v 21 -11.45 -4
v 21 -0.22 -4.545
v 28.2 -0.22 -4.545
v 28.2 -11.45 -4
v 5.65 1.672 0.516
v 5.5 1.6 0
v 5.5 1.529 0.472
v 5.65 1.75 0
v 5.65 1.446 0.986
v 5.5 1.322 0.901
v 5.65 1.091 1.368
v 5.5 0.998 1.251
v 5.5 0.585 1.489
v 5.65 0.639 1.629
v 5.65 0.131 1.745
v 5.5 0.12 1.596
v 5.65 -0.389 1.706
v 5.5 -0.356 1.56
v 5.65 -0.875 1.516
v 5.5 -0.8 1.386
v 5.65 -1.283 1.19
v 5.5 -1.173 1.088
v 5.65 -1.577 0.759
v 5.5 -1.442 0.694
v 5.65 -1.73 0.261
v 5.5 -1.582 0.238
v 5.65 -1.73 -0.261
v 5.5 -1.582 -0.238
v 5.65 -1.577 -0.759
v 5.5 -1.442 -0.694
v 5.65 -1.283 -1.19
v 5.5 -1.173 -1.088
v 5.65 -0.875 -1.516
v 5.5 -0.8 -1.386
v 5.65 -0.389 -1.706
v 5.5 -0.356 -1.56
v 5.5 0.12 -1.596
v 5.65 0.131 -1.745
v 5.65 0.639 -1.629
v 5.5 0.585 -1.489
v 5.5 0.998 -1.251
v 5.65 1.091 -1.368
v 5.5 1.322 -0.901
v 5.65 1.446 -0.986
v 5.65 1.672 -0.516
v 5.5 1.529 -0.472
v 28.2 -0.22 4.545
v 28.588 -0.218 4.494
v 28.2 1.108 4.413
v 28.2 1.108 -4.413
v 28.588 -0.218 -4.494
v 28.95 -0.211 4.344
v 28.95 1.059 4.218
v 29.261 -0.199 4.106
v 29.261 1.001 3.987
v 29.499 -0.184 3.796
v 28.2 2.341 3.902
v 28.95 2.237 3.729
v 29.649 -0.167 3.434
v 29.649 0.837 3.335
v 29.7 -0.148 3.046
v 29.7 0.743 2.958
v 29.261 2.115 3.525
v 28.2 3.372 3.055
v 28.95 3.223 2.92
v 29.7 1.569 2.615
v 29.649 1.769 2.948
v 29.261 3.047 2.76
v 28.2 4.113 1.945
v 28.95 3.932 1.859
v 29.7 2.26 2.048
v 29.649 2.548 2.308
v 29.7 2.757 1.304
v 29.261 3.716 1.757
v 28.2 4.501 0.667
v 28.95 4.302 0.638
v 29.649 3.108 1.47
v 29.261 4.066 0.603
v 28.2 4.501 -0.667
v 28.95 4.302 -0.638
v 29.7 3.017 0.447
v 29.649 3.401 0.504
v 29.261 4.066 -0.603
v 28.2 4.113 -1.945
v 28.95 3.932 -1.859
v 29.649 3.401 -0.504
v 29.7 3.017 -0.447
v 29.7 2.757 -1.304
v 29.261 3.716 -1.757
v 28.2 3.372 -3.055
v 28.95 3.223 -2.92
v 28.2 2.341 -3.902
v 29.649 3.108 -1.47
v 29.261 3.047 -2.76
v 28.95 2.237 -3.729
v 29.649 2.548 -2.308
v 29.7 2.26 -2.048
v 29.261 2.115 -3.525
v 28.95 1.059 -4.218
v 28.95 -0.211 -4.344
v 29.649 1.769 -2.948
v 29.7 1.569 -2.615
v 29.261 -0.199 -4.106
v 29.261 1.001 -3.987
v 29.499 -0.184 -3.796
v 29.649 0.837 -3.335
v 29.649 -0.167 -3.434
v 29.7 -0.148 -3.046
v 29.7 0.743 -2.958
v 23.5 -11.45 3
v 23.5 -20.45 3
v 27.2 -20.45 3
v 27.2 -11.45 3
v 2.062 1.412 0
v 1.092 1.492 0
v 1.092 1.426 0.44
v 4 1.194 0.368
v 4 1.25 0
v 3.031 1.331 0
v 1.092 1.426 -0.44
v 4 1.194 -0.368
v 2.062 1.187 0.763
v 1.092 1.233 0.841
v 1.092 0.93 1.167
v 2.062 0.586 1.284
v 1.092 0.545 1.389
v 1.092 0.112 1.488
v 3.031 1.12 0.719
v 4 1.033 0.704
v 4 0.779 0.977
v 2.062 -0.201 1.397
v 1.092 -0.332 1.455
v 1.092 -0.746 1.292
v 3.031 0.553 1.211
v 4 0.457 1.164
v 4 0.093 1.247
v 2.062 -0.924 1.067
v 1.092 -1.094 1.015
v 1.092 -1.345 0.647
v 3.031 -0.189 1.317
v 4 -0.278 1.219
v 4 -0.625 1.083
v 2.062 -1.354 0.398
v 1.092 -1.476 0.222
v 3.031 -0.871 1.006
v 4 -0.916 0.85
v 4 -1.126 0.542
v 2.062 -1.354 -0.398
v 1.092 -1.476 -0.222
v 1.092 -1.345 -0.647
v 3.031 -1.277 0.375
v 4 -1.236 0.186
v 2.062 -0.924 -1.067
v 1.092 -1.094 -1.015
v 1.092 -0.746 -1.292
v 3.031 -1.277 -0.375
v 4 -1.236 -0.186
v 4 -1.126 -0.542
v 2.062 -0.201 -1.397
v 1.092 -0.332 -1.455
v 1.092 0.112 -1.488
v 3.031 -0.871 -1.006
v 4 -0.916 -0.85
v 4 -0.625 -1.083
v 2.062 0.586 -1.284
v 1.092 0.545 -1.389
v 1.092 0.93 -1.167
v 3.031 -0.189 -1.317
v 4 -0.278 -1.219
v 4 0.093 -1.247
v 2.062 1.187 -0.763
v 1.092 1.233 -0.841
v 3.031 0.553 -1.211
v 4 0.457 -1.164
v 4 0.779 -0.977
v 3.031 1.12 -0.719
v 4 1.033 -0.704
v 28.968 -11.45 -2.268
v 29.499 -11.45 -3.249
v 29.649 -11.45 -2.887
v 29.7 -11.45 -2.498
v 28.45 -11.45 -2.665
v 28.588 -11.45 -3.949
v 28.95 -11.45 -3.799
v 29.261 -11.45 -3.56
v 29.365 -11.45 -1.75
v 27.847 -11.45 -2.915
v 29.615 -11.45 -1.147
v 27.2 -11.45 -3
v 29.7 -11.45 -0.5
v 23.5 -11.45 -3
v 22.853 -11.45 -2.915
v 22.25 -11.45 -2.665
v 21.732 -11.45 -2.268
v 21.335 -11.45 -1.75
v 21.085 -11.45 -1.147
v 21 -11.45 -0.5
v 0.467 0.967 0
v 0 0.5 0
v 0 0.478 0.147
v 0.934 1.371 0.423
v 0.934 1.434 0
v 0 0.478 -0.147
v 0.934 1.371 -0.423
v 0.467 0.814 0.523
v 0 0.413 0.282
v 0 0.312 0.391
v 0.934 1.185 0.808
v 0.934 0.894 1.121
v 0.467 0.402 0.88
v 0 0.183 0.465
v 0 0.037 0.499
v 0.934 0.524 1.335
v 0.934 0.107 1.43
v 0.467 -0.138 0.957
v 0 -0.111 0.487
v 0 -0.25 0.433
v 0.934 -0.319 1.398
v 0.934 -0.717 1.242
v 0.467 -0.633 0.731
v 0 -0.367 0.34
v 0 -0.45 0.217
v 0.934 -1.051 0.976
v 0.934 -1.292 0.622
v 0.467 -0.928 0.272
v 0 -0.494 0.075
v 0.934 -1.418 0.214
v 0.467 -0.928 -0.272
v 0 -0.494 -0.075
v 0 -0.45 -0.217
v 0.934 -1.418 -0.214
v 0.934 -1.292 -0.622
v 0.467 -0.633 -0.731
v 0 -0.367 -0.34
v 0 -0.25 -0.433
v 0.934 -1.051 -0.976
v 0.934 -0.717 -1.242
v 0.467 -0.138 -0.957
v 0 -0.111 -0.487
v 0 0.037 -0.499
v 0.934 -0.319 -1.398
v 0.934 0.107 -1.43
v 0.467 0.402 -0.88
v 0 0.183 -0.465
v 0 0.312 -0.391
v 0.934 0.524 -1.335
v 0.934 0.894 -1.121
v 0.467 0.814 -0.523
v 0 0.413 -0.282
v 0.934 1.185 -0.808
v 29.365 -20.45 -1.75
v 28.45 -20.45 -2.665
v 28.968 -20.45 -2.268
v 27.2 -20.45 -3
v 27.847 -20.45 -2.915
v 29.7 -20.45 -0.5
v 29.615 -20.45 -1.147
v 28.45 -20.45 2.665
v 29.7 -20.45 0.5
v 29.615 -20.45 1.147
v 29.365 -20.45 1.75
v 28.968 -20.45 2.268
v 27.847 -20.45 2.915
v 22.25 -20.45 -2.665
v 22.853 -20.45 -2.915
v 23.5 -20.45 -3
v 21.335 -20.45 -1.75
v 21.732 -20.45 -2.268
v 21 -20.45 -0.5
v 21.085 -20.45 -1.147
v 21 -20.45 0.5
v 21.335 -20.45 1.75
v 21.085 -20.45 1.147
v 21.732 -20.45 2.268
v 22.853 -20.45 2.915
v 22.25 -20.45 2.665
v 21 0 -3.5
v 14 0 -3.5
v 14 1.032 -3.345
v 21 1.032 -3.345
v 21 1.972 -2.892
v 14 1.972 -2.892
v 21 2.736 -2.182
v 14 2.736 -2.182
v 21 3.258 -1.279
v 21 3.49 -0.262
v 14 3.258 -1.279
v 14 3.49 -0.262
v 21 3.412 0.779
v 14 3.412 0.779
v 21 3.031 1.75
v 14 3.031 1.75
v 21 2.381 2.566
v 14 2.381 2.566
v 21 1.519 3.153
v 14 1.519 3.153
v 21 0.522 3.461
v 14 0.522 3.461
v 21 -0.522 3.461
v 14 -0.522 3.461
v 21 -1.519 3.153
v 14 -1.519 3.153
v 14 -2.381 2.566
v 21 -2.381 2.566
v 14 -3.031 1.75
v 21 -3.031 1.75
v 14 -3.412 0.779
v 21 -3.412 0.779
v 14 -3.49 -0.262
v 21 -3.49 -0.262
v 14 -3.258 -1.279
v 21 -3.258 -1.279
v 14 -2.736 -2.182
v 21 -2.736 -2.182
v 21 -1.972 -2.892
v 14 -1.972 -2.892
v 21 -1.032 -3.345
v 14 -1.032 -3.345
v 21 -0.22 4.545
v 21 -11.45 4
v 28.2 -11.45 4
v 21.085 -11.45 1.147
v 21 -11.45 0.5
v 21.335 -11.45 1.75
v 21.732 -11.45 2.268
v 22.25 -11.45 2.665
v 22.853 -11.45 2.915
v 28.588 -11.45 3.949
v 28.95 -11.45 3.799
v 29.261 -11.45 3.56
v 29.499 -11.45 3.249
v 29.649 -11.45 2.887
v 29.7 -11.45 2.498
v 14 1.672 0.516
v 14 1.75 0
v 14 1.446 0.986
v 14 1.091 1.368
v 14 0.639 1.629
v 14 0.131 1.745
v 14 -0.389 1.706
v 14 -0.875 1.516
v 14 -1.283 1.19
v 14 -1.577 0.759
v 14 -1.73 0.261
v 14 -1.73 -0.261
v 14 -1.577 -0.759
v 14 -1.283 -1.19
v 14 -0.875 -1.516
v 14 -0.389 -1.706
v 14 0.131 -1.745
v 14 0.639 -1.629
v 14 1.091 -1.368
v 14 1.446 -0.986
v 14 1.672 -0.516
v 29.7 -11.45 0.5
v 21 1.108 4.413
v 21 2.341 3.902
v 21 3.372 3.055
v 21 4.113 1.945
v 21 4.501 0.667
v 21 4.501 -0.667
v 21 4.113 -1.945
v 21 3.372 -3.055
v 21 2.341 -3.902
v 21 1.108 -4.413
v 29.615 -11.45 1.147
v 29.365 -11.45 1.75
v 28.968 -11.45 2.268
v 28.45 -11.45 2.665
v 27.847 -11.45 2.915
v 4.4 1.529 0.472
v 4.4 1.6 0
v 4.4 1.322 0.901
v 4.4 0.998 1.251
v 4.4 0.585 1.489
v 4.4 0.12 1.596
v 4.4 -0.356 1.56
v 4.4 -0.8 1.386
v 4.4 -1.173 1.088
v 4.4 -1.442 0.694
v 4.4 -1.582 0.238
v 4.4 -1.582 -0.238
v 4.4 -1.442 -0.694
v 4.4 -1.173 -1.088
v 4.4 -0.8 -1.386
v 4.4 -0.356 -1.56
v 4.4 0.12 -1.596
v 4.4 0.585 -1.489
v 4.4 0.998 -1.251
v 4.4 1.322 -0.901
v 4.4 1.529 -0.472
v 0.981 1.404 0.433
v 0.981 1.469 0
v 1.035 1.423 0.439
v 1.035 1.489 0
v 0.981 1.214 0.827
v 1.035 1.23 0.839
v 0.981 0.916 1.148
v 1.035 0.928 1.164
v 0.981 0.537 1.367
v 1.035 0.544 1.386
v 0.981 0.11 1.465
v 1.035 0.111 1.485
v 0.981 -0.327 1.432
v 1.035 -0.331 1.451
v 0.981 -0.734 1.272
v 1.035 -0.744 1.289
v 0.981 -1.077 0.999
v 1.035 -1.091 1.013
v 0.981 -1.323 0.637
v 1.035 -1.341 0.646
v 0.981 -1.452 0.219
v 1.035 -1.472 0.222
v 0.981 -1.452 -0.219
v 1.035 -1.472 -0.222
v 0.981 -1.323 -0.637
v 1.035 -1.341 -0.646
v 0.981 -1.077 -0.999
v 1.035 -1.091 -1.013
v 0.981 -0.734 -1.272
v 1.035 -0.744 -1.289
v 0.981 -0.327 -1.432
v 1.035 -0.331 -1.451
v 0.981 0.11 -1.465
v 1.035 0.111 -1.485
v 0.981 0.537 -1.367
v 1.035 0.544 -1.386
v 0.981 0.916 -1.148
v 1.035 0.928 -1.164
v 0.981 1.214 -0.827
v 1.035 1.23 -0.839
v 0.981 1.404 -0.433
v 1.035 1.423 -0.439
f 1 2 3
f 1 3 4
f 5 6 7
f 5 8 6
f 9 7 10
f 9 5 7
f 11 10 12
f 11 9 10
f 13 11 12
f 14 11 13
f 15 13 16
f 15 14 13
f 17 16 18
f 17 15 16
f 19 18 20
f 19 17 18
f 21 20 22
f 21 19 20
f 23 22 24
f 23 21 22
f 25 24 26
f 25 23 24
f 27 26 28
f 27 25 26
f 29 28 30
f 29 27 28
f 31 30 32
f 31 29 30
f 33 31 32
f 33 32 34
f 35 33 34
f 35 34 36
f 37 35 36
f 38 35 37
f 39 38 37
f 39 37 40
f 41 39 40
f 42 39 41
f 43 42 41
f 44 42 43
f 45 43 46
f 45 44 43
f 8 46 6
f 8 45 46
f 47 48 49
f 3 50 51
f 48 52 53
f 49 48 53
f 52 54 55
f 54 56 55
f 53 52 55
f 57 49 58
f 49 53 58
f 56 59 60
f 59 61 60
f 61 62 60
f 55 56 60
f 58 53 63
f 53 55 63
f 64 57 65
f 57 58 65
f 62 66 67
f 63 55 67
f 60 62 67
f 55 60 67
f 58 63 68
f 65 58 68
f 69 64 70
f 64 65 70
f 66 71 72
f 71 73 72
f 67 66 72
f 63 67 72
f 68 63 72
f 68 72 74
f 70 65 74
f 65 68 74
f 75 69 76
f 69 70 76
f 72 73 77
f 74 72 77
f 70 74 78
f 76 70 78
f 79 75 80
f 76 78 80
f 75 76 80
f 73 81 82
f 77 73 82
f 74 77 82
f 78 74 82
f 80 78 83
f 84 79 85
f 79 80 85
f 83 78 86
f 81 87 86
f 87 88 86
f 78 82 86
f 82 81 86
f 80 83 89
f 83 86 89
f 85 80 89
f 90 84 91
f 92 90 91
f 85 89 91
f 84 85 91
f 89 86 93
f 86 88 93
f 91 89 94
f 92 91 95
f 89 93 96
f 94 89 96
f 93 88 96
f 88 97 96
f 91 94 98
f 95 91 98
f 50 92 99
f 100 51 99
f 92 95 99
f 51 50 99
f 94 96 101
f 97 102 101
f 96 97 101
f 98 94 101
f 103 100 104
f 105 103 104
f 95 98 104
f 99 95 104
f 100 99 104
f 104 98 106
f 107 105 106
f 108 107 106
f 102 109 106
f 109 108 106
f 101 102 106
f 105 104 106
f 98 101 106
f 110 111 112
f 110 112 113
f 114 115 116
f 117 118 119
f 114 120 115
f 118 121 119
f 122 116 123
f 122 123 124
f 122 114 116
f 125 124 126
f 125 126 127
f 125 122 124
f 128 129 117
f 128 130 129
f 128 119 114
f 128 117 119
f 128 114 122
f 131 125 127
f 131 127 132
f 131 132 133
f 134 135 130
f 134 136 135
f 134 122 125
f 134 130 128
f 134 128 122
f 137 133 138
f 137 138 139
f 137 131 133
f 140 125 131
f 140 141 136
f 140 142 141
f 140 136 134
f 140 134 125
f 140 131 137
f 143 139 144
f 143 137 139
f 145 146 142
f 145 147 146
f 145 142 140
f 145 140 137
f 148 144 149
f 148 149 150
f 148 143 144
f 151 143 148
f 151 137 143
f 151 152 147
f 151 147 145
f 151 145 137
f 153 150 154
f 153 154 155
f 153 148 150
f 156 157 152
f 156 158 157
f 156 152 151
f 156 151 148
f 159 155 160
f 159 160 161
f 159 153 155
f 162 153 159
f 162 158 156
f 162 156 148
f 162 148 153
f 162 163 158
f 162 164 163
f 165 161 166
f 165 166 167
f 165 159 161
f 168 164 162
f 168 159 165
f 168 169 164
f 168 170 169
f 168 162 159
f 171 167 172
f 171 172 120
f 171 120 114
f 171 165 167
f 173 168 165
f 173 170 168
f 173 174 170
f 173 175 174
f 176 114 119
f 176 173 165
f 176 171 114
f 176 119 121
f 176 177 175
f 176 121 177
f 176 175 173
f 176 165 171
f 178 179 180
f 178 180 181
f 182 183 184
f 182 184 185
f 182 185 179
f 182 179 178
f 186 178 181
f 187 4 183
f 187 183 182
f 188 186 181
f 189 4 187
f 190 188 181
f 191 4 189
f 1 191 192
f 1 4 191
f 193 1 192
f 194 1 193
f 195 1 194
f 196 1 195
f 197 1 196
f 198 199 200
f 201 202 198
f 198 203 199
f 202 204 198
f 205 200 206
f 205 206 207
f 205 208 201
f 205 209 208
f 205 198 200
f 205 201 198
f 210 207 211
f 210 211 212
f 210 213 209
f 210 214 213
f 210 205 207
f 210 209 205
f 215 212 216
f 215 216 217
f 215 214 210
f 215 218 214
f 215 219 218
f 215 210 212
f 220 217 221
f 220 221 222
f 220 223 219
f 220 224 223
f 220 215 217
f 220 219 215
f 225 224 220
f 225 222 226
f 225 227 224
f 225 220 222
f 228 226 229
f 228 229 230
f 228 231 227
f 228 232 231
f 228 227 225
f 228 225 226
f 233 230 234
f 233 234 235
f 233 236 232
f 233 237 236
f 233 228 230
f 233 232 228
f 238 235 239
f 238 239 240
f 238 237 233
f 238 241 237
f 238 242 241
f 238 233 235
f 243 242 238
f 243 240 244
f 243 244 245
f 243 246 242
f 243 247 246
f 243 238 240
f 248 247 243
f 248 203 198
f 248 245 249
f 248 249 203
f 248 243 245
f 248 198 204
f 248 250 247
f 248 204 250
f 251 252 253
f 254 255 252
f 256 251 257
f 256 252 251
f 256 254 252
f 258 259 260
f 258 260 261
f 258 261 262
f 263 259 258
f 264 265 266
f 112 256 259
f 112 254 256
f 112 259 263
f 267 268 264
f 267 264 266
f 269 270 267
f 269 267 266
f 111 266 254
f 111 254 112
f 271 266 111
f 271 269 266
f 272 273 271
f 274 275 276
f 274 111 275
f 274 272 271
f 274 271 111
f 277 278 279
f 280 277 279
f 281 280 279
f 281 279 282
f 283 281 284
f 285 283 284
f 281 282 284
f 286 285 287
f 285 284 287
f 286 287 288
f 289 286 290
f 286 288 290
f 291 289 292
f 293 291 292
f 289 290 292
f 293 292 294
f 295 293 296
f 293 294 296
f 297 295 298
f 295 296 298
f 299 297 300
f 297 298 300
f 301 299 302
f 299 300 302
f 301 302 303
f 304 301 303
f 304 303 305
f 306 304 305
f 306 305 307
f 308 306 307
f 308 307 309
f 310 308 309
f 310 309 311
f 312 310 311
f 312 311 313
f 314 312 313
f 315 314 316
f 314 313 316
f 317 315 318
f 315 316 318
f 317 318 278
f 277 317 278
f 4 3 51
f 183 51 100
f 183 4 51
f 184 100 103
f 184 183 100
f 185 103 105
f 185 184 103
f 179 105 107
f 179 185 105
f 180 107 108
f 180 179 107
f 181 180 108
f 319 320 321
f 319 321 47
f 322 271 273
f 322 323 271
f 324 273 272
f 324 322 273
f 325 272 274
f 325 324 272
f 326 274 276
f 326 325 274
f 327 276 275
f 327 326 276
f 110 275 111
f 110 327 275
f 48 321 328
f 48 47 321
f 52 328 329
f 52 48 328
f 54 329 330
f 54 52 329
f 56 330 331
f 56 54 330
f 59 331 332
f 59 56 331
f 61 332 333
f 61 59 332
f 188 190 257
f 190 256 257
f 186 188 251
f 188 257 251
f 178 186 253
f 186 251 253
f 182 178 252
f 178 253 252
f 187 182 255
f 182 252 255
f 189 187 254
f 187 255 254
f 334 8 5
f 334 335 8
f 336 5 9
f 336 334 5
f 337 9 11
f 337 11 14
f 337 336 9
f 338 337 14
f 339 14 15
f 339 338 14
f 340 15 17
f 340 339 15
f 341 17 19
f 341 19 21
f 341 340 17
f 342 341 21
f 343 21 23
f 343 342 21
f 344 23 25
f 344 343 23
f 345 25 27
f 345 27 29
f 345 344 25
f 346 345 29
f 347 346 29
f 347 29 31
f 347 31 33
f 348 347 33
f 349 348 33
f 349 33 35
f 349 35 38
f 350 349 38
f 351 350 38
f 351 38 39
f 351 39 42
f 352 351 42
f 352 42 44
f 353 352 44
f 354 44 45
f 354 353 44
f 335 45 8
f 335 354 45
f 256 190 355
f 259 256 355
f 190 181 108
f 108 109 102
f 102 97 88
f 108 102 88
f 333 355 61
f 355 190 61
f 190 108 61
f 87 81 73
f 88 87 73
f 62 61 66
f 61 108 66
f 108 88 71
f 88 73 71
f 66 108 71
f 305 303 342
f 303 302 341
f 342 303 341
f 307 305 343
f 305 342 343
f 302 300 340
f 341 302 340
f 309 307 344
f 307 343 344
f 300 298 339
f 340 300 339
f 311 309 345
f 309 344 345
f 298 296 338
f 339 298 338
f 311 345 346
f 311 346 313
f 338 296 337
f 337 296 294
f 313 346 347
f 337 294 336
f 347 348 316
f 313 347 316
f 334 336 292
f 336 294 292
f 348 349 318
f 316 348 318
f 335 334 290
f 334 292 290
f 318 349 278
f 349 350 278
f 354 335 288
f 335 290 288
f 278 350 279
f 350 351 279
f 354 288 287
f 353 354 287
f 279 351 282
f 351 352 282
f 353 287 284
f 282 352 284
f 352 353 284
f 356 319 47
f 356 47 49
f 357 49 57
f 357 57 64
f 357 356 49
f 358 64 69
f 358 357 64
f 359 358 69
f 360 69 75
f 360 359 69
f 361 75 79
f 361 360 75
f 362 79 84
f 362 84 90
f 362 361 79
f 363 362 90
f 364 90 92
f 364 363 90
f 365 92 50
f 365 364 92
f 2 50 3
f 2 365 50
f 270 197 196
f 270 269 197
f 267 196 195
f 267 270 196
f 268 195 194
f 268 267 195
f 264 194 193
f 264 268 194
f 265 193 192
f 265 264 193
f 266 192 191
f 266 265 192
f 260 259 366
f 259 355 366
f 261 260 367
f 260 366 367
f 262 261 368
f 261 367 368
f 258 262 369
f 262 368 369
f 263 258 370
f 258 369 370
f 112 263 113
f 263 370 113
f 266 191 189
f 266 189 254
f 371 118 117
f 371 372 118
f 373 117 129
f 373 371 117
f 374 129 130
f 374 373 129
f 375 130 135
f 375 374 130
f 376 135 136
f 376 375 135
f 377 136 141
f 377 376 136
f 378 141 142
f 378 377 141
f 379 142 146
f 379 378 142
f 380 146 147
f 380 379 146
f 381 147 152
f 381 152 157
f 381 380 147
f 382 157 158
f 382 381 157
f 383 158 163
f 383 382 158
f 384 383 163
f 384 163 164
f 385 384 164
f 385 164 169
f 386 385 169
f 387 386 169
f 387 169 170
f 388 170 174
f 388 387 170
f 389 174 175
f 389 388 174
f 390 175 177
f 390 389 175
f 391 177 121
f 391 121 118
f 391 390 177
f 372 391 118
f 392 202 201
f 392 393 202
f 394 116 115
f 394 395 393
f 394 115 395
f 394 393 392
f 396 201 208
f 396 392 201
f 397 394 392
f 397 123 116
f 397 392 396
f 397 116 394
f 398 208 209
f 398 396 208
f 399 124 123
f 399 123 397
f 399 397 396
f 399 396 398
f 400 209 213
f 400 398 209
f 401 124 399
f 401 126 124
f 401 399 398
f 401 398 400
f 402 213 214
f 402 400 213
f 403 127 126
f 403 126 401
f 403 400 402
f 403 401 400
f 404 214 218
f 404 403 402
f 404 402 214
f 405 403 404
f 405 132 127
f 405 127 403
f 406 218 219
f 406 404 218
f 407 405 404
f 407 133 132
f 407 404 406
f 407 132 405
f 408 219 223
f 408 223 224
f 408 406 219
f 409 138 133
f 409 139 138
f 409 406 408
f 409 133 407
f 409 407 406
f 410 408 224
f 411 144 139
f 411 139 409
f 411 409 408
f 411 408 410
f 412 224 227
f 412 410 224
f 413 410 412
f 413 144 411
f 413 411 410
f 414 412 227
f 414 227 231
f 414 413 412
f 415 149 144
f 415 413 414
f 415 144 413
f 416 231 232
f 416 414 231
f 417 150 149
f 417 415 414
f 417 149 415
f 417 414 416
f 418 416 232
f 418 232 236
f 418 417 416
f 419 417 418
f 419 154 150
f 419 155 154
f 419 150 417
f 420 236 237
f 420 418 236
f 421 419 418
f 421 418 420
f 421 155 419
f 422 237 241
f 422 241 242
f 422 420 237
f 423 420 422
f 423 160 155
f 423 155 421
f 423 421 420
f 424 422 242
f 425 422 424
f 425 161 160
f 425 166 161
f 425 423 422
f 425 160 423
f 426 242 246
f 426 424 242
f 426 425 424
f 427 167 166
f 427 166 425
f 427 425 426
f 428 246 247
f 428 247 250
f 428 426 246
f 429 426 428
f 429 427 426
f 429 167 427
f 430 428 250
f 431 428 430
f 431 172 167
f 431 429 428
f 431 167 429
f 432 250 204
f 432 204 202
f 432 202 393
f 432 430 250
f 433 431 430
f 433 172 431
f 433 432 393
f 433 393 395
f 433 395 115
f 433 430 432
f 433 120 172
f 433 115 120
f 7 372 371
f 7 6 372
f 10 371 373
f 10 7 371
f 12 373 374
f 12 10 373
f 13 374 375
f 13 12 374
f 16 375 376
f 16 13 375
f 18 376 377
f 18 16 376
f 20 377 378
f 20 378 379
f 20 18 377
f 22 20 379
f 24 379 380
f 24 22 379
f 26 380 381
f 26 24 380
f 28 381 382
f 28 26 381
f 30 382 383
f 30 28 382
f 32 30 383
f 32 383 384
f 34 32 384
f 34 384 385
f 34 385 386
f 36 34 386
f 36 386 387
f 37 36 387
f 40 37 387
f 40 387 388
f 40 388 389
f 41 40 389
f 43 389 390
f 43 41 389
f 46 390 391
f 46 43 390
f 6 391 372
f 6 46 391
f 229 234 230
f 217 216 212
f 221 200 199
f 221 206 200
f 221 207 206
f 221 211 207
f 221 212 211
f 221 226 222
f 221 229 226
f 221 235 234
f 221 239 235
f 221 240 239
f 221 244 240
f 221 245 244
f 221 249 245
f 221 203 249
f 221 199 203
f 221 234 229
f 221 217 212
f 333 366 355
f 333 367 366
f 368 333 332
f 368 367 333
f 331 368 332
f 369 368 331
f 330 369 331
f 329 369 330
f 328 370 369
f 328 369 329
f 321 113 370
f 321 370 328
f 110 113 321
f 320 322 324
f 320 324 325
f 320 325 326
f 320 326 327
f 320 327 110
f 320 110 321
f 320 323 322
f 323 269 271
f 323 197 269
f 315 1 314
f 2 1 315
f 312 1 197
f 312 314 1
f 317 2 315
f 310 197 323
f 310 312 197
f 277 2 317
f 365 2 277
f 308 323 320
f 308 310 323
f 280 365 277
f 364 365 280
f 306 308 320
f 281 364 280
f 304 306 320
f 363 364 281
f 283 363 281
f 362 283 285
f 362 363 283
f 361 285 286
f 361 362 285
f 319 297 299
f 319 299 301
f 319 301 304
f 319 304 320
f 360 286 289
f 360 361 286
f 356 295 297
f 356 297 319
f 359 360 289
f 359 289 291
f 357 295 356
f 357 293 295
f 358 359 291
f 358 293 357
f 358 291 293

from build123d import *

# Parameters (mm, degrees)
SKETCH1_R           = 3.5
BOSS_EXTRUDE1_DEPTH = 7
BOSS_EXTRUDE2_DEPTH = 8.7
FILLET1_R           = 2.5
FILLET2_R           = 1.5


with BuildPart() as part:
    # SurfaceCut1: read off the stored shape, not the designer's step
    # SurfaceCut1 outline → SurfaceCut1 (revolve)
    with BuildSketch(Plane.YX):
        with BuildLine():
            Line((0.5, 0), (1.434408923, 0.934408923))
            ThreePointArc((1.434408923, 0.934408923), (1.4807846, 1.007038752), (1.492296719, 1.092439376))
            Line((1.492296719, 1.092439376), (1.25, 4))
            Line((1.25, 4), (1.6, 4.4))
            Line((1.6, 4.4), (1.6, 5.5))
            Line((1.6, 5.5), (1.75, 5.65))
            Line((1.75, 5.65), (1.75, 14))
            Line((1.75, 14), (0, 14))
            Line((0, 14), (0, 0))
            Line((0, 0), (0.5, 0))
        make_face()
    revolve(axis=Axis((0, 0, 0), (1, 0, 0)))

    # Sketch1 → Boss-Extrude1 (add)
    with BuildSketch(Plane(origin=(14, 0, 0), x_dir=(0, 0, -1), z_dir=(1, 0, 0))):
        Circle(SKETCH1_R)
    extrude(amount=BOSS_EXTRUDE1_DEPTH)

    # Sketch2 → Boss-Extrude2 (add)
    with BuildSketch(Plane(origin=(21, 0, 0), x_dir=(0, 0, -1), z_dir=(1, 0, 0))):
        with BuildLine():
            Line((-4, -11.45), (-4.544657599, -0.220425293))
            ThreePointArc((-4.544657599, -0.220425293), (0, 4.55), (4.544657599, -0.220425293))
            Line((4.544657599, -0.220425293), (4, -11.45))
            Line((4, -11.45), (3, -11.45))
            Line((3, -11.45), (3, -20.45))
            Line((3, -20.45), (-3, -20.45))
            Line((-3, -20.45), (-3, -11.45))
            Line((-3, -11.45), (-4, -11.45))
        make_face()
    extrude(amount=BOSS_EXTRUDE2_DEPTH)

    # Fillet1
    fillet1_edges = [part.edges().sort_by_distance(p)[0] for p in [
        (21, -15.95, 3),
        (21, -15.95, -3),
        (29.7, -15.95, 3),
        (29.7, -15.95, -3),
    ]]
    fillet(fillet1_edges, radius=FILLET1_R)

    # Fillet2
    fillet2_edges = [part.edges().sort_by_distance(p)[0] for p in [
        (29.7, 4.55, 0),
        (29.7, -5.835212647, 4.272328799),
        (29.7, -5.835212647, -4.272328799),
    ]]
    fillet(fillet2_edges, radius=FILLET2_R)


solid = part.part
